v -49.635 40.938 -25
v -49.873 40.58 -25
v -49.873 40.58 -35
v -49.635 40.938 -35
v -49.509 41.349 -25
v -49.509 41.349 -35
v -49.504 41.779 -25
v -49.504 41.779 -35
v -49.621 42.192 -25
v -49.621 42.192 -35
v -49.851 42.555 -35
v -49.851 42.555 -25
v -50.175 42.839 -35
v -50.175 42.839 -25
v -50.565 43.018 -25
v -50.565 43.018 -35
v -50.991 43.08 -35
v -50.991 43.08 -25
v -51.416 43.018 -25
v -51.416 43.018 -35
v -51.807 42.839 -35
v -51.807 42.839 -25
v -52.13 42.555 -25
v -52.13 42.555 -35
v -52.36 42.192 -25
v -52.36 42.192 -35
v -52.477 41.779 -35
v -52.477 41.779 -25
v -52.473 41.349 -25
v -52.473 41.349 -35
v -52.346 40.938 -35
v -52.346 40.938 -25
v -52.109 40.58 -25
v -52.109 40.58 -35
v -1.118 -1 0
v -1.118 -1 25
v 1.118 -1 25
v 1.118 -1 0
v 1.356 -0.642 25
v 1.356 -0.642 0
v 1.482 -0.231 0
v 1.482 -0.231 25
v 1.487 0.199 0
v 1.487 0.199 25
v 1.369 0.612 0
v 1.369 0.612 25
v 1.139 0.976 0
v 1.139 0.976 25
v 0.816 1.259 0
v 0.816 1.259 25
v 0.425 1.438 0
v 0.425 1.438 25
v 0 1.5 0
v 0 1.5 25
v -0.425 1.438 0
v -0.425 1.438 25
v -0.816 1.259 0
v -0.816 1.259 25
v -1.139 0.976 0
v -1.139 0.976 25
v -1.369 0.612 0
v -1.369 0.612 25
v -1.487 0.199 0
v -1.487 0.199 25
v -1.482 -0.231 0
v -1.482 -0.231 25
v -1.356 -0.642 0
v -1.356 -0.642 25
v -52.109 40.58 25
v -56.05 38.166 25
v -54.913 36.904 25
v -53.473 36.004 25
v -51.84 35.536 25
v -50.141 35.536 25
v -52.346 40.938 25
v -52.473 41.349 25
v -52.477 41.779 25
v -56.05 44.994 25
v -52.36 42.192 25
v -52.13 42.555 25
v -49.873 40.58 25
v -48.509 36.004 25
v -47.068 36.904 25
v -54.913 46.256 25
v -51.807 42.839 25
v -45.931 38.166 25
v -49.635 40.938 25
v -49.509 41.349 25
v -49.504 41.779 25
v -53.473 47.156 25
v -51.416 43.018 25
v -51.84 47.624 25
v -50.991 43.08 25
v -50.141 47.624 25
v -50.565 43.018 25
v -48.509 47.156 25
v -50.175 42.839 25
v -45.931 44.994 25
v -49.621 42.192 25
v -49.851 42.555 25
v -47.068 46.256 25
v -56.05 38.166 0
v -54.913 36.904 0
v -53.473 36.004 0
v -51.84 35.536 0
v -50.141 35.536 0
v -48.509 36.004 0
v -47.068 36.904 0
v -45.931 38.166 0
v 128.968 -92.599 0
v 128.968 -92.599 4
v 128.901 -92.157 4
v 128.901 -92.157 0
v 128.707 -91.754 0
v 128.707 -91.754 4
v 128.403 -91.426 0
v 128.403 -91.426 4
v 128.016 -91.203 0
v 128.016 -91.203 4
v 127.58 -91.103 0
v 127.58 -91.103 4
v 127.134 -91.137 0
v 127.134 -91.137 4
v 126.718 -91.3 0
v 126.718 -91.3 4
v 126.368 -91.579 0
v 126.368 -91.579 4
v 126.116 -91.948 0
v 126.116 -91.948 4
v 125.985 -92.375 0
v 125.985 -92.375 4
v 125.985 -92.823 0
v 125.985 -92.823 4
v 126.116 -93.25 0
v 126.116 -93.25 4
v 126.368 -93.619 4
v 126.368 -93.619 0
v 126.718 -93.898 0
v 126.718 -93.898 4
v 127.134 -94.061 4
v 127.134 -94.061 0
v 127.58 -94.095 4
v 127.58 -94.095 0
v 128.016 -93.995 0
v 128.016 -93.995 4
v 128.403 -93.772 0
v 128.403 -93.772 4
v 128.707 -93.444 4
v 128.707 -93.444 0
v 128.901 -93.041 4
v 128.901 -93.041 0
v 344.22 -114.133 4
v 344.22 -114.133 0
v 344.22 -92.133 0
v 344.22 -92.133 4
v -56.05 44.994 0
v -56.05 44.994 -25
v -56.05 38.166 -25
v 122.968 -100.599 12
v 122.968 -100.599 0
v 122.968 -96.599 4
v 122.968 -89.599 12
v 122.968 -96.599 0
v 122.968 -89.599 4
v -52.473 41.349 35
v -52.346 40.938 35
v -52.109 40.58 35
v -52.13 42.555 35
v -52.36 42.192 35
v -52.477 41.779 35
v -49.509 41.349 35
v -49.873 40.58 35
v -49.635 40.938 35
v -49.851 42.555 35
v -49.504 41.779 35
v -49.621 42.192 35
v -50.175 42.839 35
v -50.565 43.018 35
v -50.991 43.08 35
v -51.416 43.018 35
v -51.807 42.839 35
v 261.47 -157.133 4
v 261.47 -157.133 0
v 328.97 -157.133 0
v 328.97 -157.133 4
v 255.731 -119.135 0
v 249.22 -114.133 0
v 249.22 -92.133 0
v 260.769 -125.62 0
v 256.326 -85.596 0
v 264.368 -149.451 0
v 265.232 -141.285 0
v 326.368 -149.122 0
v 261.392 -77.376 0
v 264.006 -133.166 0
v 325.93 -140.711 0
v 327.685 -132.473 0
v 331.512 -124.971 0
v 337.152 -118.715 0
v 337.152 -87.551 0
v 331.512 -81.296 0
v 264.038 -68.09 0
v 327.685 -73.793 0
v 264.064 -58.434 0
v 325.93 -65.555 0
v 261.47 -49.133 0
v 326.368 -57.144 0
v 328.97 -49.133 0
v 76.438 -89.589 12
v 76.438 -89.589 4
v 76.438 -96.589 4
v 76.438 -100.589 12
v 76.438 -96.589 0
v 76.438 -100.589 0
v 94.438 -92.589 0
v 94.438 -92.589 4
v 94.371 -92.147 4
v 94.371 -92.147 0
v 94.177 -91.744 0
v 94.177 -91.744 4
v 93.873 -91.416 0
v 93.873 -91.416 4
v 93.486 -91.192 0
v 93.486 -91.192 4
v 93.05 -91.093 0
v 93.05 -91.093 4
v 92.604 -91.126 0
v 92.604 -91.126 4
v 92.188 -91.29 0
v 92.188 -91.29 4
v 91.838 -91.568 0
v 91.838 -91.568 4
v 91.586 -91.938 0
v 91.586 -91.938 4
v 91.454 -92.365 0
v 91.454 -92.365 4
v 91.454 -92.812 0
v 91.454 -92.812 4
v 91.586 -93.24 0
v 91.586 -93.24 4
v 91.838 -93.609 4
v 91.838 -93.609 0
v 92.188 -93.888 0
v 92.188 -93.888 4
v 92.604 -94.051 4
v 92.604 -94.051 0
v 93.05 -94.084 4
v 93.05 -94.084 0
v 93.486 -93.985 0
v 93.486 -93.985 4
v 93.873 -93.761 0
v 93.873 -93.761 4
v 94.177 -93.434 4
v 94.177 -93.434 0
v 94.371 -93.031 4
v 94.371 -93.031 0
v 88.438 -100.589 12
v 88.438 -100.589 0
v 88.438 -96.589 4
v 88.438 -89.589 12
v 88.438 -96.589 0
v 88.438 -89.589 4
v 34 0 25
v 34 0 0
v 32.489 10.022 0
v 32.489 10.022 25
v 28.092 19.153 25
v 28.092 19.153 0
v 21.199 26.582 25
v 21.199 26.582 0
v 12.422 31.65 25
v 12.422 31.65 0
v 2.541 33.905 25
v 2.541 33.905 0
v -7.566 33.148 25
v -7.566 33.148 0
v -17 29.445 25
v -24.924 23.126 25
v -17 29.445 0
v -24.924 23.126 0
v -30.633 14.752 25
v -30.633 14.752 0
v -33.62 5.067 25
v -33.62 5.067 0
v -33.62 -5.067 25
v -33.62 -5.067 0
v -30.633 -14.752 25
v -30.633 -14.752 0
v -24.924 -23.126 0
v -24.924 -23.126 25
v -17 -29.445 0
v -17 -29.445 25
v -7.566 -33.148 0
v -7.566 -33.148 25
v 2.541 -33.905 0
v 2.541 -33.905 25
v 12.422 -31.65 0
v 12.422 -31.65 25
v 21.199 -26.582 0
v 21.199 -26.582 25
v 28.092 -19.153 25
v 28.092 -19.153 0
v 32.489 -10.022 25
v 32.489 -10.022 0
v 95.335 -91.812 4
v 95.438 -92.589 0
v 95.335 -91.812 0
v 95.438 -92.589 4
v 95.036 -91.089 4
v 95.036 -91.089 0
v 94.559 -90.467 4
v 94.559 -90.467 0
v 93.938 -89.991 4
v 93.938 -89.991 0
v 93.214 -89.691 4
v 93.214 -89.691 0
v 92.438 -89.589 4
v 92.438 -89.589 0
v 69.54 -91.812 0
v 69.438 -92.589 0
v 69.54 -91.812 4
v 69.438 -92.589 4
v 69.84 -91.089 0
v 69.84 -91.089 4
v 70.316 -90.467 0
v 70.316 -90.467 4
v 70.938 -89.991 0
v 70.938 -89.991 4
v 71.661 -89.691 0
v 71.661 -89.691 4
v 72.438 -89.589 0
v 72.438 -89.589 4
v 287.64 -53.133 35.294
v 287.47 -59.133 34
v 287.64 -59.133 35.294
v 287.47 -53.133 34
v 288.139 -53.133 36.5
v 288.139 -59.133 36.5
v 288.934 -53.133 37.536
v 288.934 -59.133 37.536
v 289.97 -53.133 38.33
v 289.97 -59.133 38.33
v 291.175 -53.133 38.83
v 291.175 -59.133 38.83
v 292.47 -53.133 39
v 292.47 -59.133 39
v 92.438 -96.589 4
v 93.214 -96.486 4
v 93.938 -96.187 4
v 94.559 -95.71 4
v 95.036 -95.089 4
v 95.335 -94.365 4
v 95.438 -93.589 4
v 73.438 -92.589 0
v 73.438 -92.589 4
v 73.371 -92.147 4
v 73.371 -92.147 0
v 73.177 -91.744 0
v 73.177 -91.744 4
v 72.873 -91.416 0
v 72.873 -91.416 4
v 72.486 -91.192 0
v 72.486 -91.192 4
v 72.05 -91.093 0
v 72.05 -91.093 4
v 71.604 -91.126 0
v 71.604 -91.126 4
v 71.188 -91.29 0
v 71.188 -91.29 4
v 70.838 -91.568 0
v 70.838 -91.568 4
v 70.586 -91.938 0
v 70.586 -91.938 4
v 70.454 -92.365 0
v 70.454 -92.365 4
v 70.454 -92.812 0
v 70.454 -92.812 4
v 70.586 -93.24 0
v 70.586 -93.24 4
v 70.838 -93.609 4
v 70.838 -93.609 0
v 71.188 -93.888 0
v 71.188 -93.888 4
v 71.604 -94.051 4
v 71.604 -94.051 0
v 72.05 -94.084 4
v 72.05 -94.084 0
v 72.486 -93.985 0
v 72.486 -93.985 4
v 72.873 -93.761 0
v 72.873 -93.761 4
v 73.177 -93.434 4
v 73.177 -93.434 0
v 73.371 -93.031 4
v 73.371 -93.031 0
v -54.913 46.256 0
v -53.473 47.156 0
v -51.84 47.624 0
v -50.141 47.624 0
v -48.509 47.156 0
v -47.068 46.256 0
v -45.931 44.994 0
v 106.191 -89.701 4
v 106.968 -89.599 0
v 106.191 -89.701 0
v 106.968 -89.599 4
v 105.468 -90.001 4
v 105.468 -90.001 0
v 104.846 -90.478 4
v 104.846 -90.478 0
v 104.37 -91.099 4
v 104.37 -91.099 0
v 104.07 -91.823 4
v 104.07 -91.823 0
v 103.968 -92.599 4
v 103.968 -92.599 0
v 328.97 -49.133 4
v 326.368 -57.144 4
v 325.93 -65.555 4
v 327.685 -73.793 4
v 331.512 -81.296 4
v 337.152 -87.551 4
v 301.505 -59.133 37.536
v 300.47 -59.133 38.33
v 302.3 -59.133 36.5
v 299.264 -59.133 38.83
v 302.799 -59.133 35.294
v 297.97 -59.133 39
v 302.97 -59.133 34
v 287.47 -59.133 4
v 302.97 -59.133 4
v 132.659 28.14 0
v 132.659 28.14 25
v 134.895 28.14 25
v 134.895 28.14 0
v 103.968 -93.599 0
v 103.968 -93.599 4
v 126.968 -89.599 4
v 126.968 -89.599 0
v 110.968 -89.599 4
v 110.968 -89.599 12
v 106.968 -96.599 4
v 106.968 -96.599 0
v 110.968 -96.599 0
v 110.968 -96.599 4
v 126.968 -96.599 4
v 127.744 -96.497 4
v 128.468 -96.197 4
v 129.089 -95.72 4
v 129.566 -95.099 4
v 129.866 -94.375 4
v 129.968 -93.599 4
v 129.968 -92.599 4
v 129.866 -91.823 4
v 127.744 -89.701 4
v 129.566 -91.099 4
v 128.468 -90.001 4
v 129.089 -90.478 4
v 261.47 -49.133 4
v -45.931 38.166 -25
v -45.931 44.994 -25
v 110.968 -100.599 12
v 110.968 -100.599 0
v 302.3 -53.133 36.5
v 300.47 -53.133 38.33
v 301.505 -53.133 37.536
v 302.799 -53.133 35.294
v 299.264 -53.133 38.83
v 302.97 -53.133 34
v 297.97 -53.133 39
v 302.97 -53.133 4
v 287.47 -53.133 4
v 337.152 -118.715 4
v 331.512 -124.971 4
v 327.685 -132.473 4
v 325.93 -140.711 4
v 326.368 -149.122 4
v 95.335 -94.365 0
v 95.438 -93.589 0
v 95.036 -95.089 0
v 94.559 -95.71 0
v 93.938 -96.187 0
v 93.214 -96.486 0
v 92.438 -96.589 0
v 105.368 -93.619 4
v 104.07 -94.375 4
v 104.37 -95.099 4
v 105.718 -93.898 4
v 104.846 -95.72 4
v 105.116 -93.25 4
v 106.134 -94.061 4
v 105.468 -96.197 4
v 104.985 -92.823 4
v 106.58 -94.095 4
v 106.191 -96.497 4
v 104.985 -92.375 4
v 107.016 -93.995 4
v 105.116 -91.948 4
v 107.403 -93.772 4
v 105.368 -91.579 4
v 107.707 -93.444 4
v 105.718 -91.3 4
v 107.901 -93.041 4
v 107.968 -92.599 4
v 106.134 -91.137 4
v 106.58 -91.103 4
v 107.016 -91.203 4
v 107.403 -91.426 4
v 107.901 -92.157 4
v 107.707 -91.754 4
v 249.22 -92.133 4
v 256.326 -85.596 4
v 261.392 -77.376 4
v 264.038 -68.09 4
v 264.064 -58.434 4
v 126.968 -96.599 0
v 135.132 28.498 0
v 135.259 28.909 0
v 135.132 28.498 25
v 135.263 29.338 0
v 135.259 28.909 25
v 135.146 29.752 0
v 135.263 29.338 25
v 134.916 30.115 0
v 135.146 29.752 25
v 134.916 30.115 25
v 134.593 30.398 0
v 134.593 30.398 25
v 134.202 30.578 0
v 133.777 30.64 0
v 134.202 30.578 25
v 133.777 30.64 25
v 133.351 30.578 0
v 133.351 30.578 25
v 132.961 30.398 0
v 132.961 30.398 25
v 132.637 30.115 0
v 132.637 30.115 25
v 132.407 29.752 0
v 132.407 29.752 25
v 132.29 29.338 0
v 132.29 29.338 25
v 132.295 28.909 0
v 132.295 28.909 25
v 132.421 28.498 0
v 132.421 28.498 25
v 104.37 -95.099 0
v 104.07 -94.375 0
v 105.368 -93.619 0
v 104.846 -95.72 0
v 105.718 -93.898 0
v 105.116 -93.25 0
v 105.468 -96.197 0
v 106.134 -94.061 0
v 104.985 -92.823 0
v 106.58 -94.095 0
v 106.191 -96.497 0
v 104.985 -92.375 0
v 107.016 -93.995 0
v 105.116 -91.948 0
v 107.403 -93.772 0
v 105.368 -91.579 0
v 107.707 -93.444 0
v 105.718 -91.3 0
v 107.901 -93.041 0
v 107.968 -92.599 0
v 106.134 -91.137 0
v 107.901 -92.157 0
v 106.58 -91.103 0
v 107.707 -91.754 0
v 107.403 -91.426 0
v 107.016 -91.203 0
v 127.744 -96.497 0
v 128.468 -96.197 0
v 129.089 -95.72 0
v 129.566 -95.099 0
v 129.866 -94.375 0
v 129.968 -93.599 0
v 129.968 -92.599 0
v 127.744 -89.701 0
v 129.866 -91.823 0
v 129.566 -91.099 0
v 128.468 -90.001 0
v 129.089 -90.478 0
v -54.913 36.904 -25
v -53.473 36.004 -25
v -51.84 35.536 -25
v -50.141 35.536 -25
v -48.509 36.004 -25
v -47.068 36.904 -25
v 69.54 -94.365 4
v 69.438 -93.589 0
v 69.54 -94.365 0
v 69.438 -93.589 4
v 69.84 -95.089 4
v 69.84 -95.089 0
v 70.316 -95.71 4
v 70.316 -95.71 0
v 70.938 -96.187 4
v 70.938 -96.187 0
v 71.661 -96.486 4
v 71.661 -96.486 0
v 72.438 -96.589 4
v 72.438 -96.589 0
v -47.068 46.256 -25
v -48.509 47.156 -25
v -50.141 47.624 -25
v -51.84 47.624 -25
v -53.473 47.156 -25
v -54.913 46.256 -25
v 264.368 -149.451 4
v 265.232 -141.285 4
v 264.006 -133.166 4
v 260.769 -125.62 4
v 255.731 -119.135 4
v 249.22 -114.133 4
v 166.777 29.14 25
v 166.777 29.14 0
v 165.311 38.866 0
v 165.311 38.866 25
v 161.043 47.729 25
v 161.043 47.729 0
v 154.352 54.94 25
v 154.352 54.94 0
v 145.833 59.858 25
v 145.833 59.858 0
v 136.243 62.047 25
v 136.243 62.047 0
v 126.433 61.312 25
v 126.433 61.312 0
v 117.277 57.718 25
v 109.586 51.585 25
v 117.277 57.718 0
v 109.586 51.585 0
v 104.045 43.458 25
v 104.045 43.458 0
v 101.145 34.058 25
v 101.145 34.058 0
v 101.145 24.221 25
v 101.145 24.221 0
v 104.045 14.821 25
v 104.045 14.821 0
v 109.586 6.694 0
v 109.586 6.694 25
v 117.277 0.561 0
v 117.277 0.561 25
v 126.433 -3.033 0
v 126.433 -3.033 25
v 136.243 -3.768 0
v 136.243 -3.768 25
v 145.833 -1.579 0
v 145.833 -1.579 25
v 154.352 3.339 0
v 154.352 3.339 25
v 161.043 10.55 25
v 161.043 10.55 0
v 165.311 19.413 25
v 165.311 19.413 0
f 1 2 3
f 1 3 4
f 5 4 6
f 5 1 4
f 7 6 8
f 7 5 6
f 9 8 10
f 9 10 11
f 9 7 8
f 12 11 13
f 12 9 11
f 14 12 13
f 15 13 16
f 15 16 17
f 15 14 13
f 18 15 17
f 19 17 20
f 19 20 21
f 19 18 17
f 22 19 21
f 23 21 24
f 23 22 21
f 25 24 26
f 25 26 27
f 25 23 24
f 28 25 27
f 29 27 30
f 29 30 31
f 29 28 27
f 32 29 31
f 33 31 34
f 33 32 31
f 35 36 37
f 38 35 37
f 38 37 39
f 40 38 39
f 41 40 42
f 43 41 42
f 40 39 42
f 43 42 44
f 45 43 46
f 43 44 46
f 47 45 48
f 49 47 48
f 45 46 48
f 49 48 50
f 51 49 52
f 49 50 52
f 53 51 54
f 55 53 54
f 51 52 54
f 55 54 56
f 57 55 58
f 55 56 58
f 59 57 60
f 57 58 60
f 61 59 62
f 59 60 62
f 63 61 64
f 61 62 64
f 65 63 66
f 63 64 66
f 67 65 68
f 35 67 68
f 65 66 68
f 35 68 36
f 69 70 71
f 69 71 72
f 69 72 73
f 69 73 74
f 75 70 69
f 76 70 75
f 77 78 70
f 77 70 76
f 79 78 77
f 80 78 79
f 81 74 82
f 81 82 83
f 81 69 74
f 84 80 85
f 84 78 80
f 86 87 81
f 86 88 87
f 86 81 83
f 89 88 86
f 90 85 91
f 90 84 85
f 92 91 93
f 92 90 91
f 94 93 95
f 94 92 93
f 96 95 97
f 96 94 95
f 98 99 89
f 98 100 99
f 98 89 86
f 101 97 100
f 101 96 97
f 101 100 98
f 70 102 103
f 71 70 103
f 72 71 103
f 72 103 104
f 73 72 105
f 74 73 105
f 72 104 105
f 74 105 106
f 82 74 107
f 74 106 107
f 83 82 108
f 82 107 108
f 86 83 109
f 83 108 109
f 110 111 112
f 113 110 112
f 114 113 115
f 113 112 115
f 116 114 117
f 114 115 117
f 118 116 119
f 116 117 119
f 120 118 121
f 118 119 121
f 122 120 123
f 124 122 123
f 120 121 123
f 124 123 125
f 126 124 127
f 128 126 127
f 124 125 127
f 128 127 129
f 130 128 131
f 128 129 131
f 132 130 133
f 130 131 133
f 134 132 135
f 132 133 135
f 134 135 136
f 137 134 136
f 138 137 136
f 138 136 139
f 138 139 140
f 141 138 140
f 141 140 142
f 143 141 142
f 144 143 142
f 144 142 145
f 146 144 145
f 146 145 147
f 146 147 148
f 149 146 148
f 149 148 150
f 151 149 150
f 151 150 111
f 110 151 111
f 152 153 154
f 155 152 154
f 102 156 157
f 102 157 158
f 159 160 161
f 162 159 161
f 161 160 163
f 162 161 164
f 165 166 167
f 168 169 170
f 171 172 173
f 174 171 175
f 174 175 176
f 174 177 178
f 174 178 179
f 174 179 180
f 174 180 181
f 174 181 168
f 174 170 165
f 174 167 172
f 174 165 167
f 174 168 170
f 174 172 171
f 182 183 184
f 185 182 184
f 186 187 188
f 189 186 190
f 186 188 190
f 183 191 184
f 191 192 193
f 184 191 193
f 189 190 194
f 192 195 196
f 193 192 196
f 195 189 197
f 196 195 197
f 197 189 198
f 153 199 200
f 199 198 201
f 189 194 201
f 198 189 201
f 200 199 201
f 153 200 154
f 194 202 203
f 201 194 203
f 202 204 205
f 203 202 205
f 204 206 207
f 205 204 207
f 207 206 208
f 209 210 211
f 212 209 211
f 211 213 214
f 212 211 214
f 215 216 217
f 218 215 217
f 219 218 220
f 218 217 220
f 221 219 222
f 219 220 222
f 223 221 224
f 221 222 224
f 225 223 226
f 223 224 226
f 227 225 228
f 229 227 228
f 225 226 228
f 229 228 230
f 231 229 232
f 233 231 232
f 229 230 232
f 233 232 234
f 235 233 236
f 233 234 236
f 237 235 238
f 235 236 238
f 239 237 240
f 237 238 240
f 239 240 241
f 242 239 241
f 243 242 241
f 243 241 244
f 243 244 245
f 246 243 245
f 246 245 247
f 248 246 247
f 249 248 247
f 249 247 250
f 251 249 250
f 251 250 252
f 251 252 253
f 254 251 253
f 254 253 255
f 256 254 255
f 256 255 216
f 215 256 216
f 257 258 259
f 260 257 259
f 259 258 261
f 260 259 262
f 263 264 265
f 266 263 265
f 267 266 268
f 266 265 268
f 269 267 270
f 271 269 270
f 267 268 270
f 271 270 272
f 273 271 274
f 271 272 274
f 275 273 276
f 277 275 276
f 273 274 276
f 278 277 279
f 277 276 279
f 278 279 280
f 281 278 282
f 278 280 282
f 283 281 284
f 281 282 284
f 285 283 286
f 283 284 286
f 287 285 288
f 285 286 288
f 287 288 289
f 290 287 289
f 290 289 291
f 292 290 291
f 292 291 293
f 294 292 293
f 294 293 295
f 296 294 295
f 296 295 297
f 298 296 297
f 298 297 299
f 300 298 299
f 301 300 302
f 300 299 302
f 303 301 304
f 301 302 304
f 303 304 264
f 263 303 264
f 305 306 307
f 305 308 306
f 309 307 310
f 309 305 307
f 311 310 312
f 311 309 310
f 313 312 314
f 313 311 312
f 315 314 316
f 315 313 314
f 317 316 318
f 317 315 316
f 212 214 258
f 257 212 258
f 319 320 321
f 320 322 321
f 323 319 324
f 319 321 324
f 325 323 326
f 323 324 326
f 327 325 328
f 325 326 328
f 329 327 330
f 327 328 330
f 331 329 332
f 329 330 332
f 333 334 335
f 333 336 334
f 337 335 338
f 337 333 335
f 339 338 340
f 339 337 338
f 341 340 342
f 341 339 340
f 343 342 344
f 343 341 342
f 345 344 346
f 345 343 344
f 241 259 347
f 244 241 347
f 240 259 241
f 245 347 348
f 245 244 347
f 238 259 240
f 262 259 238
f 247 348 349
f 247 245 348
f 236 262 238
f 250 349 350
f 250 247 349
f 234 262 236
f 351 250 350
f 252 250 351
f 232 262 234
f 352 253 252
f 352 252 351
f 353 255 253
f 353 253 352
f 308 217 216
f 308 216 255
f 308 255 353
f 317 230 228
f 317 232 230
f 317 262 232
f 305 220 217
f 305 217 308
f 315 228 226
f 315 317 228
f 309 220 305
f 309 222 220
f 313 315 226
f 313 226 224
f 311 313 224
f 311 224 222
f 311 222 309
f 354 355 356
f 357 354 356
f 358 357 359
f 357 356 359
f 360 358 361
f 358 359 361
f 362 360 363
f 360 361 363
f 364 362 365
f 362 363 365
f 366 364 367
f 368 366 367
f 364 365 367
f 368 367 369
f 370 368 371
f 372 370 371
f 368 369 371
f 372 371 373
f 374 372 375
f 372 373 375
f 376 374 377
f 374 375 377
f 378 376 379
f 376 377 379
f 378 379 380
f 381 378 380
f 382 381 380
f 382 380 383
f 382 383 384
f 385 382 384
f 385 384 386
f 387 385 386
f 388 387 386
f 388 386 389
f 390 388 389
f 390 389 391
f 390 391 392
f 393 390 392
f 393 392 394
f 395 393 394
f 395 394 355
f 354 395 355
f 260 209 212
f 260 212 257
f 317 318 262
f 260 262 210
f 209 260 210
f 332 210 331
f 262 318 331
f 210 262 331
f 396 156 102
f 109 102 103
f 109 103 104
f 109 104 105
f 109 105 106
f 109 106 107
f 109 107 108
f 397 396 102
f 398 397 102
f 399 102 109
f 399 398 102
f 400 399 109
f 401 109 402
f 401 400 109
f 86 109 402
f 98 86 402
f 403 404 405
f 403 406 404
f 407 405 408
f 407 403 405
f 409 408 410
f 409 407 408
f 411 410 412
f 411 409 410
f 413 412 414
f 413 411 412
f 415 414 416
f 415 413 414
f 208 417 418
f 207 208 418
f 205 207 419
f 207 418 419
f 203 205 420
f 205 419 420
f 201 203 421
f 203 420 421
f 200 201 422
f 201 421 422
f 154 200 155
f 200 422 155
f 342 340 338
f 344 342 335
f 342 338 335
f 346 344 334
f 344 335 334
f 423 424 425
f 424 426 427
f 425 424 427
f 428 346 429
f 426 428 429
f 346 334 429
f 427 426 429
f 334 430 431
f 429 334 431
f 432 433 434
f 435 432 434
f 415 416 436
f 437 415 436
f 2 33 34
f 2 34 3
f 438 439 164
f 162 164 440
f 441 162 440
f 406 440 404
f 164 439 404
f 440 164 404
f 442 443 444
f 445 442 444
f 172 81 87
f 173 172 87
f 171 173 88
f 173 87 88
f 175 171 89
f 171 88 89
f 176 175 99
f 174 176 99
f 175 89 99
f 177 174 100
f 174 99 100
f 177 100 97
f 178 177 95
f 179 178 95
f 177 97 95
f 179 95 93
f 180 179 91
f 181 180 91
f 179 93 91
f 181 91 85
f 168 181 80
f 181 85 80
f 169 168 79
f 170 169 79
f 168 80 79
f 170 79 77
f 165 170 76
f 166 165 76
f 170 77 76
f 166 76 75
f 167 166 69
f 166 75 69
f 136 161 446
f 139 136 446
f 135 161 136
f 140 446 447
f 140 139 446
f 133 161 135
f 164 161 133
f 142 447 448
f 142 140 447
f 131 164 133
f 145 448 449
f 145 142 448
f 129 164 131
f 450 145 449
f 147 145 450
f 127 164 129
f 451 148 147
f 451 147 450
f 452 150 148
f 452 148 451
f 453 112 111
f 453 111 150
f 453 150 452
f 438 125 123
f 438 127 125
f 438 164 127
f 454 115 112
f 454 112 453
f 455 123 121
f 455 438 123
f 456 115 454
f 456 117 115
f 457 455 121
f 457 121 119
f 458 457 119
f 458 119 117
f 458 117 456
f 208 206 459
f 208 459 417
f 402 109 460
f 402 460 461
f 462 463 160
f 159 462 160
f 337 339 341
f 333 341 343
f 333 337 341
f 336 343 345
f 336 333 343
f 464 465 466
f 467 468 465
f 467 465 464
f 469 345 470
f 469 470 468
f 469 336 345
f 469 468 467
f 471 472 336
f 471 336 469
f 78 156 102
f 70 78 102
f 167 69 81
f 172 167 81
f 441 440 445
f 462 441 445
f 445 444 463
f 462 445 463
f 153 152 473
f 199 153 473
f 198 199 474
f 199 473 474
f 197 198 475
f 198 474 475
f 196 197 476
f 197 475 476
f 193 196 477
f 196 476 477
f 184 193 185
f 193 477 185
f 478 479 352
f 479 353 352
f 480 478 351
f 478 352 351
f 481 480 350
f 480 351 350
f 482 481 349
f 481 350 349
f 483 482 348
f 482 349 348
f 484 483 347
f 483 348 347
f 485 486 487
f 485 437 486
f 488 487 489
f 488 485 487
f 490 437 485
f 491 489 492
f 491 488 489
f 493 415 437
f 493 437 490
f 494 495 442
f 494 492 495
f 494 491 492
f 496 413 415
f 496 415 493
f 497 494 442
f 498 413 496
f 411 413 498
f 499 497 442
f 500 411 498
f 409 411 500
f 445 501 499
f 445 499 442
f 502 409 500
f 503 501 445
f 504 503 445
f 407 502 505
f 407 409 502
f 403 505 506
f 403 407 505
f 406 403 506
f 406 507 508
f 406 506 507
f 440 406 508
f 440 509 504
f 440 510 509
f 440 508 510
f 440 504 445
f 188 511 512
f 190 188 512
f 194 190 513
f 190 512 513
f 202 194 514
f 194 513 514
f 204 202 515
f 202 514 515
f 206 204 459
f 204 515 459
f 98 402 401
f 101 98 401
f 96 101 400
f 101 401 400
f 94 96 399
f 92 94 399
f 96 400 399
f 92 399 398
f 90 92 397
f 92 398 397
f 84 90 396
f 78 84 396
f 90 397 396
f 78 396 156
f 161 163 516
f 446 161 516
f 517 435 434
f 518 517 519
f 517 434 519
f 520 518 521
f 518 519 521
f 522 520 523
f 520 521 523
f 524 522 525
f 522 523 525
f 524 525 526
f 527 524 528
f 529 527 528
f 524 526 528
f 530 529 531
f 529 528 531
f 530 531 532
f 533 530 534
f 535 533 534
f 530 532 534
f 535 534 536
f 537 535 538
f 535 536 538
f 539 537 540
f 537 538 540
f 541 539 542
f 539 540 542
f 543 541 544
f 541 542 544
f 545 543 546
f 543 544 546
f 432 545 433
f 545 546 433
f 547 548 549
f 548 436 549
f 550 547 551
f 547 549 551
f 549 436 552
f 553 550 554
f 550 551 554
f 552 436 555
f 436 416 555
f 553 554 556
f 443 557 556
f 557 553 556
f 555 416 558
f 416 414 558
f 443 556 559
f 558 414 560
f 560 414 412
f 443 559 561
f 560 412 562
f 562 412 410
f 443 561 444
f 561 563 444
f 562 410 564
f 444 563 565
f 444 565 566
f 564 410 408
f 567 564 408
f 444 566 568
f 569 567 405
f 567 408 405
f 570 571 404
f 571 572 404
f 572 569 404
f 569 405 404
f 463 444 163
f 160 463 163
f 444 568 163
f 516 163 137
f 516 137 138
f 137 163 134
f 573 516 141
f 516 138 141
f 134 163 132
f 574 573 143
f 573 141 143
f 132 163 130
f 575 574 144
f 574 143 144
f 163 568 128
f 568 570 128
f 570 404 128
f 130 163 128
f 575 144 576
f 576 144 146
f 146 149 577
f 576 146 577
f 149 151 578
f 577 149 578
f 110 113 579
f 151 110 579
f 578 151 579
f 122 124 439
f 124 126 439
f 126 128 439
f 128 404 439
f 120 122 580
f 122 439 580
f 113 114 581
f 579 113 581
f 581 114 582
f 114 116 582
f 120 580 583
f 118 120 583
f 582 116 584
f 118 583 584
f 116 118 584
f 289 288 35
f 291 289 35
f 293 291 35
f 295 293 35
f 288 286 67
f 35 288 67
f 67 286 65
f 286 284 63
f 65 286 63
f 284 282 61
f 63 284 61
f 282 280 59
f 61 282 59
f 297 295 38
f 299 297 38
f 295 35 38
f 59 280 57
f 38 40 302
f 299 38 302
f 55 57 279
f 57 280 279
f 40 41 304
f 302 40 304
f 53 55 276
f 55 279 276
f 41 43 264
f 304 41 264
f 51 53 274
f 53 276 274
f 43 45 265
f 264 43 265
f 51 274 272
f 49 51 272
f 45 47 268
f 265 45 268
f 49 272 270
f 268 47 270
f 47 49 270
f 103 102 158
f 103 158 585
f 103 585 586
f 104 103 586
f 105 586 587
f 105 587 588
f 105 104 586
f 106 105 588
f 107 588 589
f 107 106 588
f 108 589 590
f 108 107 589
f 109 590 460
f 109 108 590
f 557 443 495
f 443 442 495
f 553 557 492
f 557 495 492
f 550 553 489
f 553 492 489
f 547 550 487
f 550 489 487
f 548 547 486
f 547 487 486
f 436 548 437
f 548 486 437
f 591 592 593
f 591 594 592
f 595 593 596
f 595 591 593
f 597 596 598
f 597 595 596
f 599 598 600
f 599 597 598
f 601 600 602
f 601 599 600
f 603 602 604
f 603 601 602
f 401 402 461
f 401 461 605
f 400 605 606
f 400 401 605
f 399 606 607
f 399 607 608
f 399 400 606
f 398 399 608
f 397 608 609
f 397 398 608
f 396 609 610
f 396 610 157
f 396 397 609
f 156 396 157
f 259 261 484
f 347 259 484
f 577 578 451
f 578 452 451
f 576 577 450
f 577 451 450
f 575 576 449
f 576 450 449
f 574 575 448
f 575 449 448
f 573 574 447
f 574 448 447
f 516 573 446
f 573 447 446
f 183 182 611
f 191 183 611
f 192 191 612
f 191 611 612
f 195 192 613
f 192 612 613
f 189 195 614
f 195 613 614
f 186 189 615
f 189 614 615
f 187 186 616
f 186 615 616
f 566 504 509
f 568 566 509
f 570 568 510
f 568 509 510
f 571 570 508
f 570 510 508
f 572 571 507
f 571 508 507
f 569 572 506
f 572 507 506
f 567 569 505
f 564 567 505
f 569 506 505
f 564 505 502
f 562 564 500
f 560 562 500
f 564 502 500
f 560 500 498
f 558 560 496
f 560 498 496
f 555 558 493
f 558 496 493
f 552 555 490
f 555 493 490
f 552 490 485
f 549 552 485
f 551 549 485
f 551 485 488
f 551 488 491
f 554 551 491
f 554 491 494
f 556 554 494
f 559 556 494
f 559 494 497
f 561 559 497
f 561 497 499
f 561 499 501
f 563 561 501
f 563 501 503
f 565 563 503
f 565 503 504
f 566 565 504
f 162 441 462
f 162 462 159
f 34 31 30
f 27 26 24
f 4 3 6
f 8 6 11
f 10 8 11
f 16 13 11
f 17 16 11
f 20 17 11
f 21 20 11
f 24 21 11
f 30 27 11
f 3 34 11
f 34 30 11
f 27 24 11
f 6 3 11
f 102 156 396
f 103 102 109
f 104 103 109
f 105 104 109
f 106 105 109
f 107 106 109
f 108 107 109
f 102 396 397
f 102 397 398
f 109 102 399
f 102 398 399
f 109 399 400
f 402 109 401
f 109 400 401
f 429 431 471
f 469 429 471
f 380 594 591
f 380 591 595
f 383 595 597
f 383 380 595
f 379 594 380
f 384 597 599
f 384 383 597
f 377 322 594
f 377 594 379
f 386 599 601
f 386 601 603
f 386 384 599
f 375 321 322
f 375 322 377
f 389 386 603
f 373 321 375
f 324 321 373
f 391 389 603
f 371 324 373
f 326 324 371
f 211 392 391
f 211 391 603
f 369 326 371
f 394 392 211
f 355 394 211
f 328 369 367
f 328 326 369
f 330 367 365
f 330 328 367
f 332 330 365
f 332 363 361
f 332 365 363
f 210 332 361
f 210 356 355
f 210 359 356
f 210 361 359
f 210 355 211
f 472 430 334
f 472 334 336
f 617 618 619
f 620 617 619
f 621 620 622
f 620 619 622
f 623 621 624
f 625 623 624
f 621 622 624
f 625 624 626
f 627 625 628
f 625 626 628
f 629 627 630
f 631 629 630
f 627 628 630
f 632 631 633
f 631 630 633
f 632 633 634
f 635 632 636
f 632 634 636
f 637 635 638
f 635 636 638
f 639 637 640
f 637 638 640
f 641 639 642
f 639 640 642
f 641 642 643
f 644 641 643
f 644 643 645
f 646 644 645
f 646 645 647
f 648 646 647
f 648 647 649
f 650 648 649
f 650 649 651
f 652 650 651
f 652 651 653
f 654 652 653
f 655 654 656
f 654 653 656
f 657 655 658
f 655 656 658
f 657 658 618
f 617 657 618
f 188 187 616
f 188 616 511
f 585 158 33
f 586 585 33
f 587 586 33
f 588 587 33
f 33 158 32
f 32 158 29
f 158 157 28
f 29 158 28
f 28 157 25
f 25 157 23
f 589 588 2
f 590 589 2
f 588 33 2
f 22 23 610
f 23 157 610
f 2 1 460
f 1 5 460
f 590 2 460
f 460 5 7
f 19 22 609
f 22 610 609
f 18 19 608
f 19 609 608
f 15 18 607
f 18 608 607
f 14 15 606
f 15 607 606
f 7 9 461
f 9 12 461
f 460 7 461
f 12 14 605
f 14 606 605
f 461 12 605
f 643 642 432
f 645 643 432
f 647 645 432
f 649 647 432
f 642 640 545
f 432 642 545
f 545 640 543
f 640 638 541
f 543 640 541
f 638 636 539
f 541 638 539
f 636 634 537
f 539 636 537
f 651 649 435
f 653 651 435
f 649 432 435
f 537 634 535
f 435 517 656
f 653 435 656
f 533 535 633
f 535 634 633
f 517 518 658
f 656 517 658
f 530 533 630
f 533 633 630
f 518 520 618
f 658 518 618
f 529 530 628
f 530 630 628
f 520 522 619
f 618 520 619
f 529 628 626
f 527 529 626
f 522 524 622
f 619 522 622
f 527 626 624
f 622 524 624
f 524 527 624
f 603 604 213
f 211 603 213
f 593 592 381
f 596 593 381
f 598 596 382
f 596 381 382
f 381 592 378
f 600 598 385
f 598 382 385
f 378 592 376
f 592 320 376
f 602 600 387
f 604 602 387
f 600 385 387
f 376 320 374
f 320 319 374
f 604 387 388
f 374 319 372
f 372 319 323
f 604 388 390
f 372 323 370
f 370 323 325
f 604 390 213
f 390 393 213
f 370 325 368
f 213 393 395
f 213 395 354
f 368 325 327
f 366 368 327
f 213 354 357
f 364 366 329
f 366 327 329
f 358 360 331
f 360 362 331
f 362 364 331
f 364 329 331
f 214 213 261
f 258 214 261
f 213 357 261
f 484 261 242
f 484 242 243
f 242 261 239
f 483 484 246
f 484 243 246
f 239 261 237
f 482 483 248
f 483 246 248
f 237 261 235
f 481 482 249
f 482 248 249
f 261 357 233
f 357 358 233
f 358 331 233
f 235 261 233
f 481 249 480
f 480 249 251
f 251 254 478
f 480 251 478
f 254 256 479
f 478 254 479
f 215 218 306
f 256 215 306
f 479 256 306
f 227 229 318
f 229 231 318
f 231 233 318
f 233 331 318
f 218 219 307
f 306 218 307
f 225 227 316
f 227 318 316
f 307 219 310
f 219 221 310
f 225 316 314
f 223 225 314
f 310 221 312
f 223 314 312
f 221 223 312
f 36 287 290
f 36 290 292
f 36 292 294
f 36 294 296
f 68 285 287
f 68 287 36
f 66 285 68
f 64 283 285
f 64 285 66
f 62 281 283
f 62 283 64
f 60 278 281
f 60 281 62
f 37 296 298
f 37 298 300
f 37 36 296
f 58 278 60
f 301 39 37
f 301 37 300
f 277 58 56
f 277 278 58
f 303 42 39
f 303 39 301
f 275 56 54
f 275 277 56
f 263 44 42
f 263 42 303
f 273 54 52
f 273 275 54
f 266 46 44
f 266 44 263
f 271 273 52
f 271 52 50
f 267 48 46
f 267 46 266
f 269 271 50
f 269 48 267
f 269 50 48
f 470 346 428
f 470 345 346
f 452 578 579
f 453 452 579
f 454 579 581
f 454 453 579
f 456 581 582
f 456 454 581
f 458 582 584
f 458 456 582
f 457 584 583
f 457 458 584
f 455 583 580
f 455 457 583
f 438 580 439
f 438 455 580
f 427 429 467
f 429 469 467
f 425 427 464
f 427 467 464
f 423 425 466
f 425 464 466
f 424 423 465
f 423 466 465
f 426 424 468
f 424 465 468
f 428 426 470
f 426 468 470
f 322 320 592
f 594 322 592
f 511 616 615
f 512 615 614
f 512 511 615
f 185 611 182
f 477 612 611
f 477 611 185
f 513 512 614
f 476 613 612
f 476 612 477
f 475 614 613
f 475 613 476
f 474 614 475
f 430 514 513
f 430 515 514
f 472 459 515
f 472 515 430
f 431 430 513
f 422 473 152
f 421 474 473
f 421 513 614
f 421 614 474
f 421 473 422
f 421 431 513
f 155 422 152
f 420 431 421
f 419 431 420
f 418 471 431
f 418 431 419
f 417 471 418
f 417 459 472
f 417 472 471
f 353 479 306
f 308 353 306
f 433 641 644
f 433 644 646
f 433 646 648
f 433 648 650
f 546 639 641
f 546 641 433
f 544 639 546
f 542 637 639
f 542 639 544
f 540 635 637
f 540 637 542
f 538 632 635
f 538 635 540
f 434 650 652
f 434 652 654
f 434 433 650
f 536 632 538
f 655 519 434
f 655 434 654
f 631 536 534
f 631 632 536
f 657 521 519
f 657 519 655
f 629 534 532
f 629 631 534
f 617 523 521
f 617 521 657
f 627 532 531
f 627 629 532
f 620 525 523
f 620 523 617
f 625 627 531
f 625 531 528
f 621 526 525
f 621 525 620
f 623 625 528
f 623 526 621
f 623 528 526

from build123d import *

# Parameters (mm, degrees)
F0_R      = 34
F1_DEPTH  = 25
F4_DEPTH  = 44
F5_DEPTH  = 25
F7_DEPTH  = 10
F8_R      = 33
F9_DEPTH  = 25
F11_DEPTH = 28.1
F13_W     = 95
F13_H     = 108
F14_DEPTH = 4
F16_DEPTH = 25
F17_W     = 15.5
F17_H     = 6
F18_DEPTH = 35
F19_R     = 5
F21_DEPTH = 12
F22_W     = 7
F22_H     = 7
F23_DEPTH = 8
F24_R     = 3
F26_R     = 1.5
F25_R     = 1.5
F27_DEPTH = 25
F29_DEPTH = 12
F30_W     = 7
F30_H     = 7
F31_DEPTH = 8
F32_R     = 3
F33_R     = 3
F34_R     = 1.5
F35_R     = 1.5
F36_DEPTH = 25


with BuildPart() as f1:
    # F0 (on Top) → F1 (new body)
    with BuildSketch(Plane.XY):
        Circle(F0_R)
    extrude(amount=F1_DEPTH)

    # F3 (on face) → F4 (cut)
    with BuildSketch(Plane.XY.offset(25)):
        with BuildLine():
            Line((0, -1), (1.1180339887, -1))
            ThreePointArc((1.1180339887, -1), (0, 1.5), (-1.1180339887, -1))
            Line((-1.1180339887, -1), (0, -1))
        make_face()
    extrude(amount=-F4_DEPTH, mode=Mode.SUBTRACT)


with BuildPart() as f5:
    # F2 (on Top) → F5 (new body)
    with BuildSketch(Plane.XY):
        with BuildLine():
            Line((-56.0500432012, 44.9939276846), (-56.0500432012, 38.1657885869))
            ThreePointArc((-56.0500432012, 38.1657885869), (-50.9907110945, 35.4763581357), (-45.9313789879, 38.1657885869))
            Line((-45.9313789879, 38.1657885869), (-45.9313789879, 44.9939276846))
            ThreePointArc((-45.9313789879, 44.9939276846), (-50.9907110945, 47.6833581357), (-56.0500432012, 44.9939276846))
        make_face()
    extrude(amount=F5_DEPTH)

    # F6 (on face) → F7 (join)
    with BuildSketch(Plane.XY.offset(25)):
        with BuildLine():
            Line((-51.0072966267, 40.5797664396), (-49.872759128, 40.5797664396))
            ThreePointArc((-49.872759128, 40.5797664396), (-50.9907110945, 43.0798581357), (-52.108663061, 40.5797664396))
            Line((-52.108663061, 40.5797664396), (-51.0072966267, 40.5797664396))
        make_face()
    extrude(amount=F7_DEPTH)


with BuildPart() as f9:
    # F8 (on Top) → F9 (new body)
    with BuildSketch(Plane.XY):
        with Locations((133.7766498327, 29.1395578533)):
            Circle(F8_R)
    extrude(amount=F9_DEPTH)

    # F10 (on face) → F11 (cut)
    with BuildSketch(Plane.XY.offset(25)):
        with BuildLine():
            Line((133.7687078238, 28.139536828), (134.8946650155, 28.139536828))
            ThreePointArc((134.8946650155, 28.139536828), (133.7766498327, 30.6395578533), (132.6586346499, 28.139536828))
            Line((132.6586346499, 28.139536828), (133.7687078238, 28.139536828))
        make_face()
    extrude(amount=-F11_DEPTH, mode=Mode.SUBTRACT)


with BuildPart() as f12_1:
    # F12: instance of F5
    add(f5.part.mirror(Plane.XY))


with BuildPart() as f14:
    # F13 (on Top) → F14 (new body)
    with BuildSketch(Plane.XY):
        with Locations((296.7195218801, -103.1332481652)):
            Rectangle(F13_W, F13_H)
    extrude(amount=F14_DEPTH)

    # F15 (on face) → F16 (cut)
    with BuildSketch(Plane.XY.offset(4)):
        with BuildLine():
            Line((261.4695218801, -49.1332481652), (249.2195218801, -49.1332481652))
            Line((249.2195218801, -49.1332481652), (249.2195218801, -92.1332481652))
            ThreePointArc((249.2195218801, -92.1332481652), (263.0342636127, -72.823930403), (261.4695218801, -49.1332481652))
        make_face()
        with BuildLine():
            Line((344.2195218801, -49.1332481652), (328.9695218801, -49.1332481652))
            ThreePointArc((328.9695218801, -49.1332481652), (327.6845782047, -73.7931700502), (344.2195218801, -92.1332481652))
            Line((344.2195218801, -92.1332481652), (344.2195218801, -49.1332481652))
        make_face()
        with BuildLine():
            ThreePointArc((344.2195218801, -114.1332481652), (327.6845782047, -132.4733262803), (328.9695218801, -157.1332481652))
            Line((328.9695218801, -157.1332481652), (344.2195218801, -157.1332481652))
            Line((344.2195218801, -157.1332481652), (344.2195218801, -114.1332481652))
        make_face()
        with BuildLine():
            ThreePointArc((261.4695218801, -157.1332481652), (264.005628305, -133.1658399396), (249.2195218801, -114.1332481652))
            Line((249.2195218801, -114.1332481652), (249.2195218801, -157.1332481652))
            Line((249.2195218801, -157.1332481652), (261.4695218801, -157.1332481652))
        make_face()
    extrude(amount=-F16_DEPTH, mode=Mode.SUBTRACT)

    # F17 (on face) → F18 (join)
    with BuildSketch(Plane.XY.offset(4)):
        with Locations((295.2195218801, -56.1332481652)):
            Rectangle(F17_W, F17_H)
    extrude(amount=F18_DEPTH)

    # F19
    f19_edges = [f14.edges().sort_by_distance(p)[0] for p in [
        (287.469522, -56.133248, 39),
        (302.969522, -56.133248, 39),
    ]]
    fillet(f19_edges, radius=F19_R)


with BuildPart() as f21:
    # F20 (on Top) → F21 (new body)
    with BuildSketch(Plane.XY):
        Polygon((76.4376826286, -96.5886867642), (76.4376826286, -100.5886867642), (88.4376826286, -100.5886867642), (88.4376826286, -96.5886867642), (95.4376826286, -96.5886867642), (95.4376826286, -89.5886867642), (69.4376826286, -89.5886867642), (69.4376826286, -96.5886867642), align=None)
    extrude(amount=F21_DEPTH)

    # F22 (on face) → F23 (cut)
    with BuildSketch(Plane.XY.offset(12)):
        with Locations((91.9376826286, -93.0886867642)):
            Rectangle(F22_W, F22_H)
        with Locations((72.9376826286, -93.0886867642)):
            Rectangle(F22_W, F22_H)
    extrude(amount=-F23_DEPTH, mode=Mode.SUBTRACT)

    # F24
    f24_edges = [f21.edges().sort_by_distance(p)[0] for p in [
        (95.437683, -89.588687, 2),
        (95.437683, -96.588687, 2),
        (69.437683, -96.588687, 2),
        (69.437683, -89.588687, 2),
    ]]
    fillet(f24_edges, radius=F24_R)

    # F26 (on face) + F25 (on face) → F27 (cut)
    with BuildSketch(Plane.XY.offset(4)):
        with Locations((71.9376826286, -92.5886867642)):
            Circle(F26_R)
    with BuildSketch(Plane.XY.offset(4)):
        with Locations((92.9376826286, -92.5886867642)):
            Circle(F25_R)
    extrude(amount=-F27_DEPTH, mode=Mode.SUBTRACT)


with BuildPart() as f29:
    # F28 (on Top) → F29 (new body)
    with BuildSketch(Plane.XY):
        Polygon((110.9677634835, -96.5990356207), (110.9677634835, -100.5990356207), (122.9677634835, -100.5990356207), (122.9677634835, -96.5990356207), (129.9677634835, -96.5990356207), (129.9677634835, -89.5990356207), (103.9677634835, -89.5990356207), (103.9677634835, -96.5990356207), align=None)
    extrude(amount=F29_DEPTH)

    # F30 (on face) → F31 (cut)
    with BuildSketch(Plane.XY.offset(12)):
        with Locations((126.4677634835, -93.0990356207)):
            Rectangle(F30_W, F30_H)
        with Locations((107.4677634835, -93.0990356207)):
            Rectangle(F30_W, F30_H)
    extrude(amount=-F31_DEPTH, mode=Mode.SUBTRACT)

    # F32
    f32_edges = [f29.edges().sort_by_distance(p)[0] for p in [
        (129.967763, -89.599036, 2),
        (129.967763, -96.599036, 2),
    ]]
    fillet(f32_edges, radius=F32_R)

    # F33
    f33_edges = [f29.edges().sort_by_distance(p)[0] for p in [
        (103.967763, -96.599036, 2),
        (103.967763, -89.599036, 2),
    ]]
    fillet(f33_edges, radius=F33_R)

    # F34 (on face) + F35 (on face) → F36 (cut)
    with BuildSketch(Plane.XY.offset(4)):
        with Locations((106.4677634835, -92.5990356207)):
            Circle(F34_R)
    with BuildSketch(Plane.XY.offset(4)):
        with Locations((127.4677634835, -92.5990356207)):
            Circle(F35_R)
    extrude(amount=-F36_DEPTH, mode=Mode.SUBTRACT)


solid = Compound([f1.part, f5.part, f9.part, f12_1.part, f14.part, f21.part, f29.part])
